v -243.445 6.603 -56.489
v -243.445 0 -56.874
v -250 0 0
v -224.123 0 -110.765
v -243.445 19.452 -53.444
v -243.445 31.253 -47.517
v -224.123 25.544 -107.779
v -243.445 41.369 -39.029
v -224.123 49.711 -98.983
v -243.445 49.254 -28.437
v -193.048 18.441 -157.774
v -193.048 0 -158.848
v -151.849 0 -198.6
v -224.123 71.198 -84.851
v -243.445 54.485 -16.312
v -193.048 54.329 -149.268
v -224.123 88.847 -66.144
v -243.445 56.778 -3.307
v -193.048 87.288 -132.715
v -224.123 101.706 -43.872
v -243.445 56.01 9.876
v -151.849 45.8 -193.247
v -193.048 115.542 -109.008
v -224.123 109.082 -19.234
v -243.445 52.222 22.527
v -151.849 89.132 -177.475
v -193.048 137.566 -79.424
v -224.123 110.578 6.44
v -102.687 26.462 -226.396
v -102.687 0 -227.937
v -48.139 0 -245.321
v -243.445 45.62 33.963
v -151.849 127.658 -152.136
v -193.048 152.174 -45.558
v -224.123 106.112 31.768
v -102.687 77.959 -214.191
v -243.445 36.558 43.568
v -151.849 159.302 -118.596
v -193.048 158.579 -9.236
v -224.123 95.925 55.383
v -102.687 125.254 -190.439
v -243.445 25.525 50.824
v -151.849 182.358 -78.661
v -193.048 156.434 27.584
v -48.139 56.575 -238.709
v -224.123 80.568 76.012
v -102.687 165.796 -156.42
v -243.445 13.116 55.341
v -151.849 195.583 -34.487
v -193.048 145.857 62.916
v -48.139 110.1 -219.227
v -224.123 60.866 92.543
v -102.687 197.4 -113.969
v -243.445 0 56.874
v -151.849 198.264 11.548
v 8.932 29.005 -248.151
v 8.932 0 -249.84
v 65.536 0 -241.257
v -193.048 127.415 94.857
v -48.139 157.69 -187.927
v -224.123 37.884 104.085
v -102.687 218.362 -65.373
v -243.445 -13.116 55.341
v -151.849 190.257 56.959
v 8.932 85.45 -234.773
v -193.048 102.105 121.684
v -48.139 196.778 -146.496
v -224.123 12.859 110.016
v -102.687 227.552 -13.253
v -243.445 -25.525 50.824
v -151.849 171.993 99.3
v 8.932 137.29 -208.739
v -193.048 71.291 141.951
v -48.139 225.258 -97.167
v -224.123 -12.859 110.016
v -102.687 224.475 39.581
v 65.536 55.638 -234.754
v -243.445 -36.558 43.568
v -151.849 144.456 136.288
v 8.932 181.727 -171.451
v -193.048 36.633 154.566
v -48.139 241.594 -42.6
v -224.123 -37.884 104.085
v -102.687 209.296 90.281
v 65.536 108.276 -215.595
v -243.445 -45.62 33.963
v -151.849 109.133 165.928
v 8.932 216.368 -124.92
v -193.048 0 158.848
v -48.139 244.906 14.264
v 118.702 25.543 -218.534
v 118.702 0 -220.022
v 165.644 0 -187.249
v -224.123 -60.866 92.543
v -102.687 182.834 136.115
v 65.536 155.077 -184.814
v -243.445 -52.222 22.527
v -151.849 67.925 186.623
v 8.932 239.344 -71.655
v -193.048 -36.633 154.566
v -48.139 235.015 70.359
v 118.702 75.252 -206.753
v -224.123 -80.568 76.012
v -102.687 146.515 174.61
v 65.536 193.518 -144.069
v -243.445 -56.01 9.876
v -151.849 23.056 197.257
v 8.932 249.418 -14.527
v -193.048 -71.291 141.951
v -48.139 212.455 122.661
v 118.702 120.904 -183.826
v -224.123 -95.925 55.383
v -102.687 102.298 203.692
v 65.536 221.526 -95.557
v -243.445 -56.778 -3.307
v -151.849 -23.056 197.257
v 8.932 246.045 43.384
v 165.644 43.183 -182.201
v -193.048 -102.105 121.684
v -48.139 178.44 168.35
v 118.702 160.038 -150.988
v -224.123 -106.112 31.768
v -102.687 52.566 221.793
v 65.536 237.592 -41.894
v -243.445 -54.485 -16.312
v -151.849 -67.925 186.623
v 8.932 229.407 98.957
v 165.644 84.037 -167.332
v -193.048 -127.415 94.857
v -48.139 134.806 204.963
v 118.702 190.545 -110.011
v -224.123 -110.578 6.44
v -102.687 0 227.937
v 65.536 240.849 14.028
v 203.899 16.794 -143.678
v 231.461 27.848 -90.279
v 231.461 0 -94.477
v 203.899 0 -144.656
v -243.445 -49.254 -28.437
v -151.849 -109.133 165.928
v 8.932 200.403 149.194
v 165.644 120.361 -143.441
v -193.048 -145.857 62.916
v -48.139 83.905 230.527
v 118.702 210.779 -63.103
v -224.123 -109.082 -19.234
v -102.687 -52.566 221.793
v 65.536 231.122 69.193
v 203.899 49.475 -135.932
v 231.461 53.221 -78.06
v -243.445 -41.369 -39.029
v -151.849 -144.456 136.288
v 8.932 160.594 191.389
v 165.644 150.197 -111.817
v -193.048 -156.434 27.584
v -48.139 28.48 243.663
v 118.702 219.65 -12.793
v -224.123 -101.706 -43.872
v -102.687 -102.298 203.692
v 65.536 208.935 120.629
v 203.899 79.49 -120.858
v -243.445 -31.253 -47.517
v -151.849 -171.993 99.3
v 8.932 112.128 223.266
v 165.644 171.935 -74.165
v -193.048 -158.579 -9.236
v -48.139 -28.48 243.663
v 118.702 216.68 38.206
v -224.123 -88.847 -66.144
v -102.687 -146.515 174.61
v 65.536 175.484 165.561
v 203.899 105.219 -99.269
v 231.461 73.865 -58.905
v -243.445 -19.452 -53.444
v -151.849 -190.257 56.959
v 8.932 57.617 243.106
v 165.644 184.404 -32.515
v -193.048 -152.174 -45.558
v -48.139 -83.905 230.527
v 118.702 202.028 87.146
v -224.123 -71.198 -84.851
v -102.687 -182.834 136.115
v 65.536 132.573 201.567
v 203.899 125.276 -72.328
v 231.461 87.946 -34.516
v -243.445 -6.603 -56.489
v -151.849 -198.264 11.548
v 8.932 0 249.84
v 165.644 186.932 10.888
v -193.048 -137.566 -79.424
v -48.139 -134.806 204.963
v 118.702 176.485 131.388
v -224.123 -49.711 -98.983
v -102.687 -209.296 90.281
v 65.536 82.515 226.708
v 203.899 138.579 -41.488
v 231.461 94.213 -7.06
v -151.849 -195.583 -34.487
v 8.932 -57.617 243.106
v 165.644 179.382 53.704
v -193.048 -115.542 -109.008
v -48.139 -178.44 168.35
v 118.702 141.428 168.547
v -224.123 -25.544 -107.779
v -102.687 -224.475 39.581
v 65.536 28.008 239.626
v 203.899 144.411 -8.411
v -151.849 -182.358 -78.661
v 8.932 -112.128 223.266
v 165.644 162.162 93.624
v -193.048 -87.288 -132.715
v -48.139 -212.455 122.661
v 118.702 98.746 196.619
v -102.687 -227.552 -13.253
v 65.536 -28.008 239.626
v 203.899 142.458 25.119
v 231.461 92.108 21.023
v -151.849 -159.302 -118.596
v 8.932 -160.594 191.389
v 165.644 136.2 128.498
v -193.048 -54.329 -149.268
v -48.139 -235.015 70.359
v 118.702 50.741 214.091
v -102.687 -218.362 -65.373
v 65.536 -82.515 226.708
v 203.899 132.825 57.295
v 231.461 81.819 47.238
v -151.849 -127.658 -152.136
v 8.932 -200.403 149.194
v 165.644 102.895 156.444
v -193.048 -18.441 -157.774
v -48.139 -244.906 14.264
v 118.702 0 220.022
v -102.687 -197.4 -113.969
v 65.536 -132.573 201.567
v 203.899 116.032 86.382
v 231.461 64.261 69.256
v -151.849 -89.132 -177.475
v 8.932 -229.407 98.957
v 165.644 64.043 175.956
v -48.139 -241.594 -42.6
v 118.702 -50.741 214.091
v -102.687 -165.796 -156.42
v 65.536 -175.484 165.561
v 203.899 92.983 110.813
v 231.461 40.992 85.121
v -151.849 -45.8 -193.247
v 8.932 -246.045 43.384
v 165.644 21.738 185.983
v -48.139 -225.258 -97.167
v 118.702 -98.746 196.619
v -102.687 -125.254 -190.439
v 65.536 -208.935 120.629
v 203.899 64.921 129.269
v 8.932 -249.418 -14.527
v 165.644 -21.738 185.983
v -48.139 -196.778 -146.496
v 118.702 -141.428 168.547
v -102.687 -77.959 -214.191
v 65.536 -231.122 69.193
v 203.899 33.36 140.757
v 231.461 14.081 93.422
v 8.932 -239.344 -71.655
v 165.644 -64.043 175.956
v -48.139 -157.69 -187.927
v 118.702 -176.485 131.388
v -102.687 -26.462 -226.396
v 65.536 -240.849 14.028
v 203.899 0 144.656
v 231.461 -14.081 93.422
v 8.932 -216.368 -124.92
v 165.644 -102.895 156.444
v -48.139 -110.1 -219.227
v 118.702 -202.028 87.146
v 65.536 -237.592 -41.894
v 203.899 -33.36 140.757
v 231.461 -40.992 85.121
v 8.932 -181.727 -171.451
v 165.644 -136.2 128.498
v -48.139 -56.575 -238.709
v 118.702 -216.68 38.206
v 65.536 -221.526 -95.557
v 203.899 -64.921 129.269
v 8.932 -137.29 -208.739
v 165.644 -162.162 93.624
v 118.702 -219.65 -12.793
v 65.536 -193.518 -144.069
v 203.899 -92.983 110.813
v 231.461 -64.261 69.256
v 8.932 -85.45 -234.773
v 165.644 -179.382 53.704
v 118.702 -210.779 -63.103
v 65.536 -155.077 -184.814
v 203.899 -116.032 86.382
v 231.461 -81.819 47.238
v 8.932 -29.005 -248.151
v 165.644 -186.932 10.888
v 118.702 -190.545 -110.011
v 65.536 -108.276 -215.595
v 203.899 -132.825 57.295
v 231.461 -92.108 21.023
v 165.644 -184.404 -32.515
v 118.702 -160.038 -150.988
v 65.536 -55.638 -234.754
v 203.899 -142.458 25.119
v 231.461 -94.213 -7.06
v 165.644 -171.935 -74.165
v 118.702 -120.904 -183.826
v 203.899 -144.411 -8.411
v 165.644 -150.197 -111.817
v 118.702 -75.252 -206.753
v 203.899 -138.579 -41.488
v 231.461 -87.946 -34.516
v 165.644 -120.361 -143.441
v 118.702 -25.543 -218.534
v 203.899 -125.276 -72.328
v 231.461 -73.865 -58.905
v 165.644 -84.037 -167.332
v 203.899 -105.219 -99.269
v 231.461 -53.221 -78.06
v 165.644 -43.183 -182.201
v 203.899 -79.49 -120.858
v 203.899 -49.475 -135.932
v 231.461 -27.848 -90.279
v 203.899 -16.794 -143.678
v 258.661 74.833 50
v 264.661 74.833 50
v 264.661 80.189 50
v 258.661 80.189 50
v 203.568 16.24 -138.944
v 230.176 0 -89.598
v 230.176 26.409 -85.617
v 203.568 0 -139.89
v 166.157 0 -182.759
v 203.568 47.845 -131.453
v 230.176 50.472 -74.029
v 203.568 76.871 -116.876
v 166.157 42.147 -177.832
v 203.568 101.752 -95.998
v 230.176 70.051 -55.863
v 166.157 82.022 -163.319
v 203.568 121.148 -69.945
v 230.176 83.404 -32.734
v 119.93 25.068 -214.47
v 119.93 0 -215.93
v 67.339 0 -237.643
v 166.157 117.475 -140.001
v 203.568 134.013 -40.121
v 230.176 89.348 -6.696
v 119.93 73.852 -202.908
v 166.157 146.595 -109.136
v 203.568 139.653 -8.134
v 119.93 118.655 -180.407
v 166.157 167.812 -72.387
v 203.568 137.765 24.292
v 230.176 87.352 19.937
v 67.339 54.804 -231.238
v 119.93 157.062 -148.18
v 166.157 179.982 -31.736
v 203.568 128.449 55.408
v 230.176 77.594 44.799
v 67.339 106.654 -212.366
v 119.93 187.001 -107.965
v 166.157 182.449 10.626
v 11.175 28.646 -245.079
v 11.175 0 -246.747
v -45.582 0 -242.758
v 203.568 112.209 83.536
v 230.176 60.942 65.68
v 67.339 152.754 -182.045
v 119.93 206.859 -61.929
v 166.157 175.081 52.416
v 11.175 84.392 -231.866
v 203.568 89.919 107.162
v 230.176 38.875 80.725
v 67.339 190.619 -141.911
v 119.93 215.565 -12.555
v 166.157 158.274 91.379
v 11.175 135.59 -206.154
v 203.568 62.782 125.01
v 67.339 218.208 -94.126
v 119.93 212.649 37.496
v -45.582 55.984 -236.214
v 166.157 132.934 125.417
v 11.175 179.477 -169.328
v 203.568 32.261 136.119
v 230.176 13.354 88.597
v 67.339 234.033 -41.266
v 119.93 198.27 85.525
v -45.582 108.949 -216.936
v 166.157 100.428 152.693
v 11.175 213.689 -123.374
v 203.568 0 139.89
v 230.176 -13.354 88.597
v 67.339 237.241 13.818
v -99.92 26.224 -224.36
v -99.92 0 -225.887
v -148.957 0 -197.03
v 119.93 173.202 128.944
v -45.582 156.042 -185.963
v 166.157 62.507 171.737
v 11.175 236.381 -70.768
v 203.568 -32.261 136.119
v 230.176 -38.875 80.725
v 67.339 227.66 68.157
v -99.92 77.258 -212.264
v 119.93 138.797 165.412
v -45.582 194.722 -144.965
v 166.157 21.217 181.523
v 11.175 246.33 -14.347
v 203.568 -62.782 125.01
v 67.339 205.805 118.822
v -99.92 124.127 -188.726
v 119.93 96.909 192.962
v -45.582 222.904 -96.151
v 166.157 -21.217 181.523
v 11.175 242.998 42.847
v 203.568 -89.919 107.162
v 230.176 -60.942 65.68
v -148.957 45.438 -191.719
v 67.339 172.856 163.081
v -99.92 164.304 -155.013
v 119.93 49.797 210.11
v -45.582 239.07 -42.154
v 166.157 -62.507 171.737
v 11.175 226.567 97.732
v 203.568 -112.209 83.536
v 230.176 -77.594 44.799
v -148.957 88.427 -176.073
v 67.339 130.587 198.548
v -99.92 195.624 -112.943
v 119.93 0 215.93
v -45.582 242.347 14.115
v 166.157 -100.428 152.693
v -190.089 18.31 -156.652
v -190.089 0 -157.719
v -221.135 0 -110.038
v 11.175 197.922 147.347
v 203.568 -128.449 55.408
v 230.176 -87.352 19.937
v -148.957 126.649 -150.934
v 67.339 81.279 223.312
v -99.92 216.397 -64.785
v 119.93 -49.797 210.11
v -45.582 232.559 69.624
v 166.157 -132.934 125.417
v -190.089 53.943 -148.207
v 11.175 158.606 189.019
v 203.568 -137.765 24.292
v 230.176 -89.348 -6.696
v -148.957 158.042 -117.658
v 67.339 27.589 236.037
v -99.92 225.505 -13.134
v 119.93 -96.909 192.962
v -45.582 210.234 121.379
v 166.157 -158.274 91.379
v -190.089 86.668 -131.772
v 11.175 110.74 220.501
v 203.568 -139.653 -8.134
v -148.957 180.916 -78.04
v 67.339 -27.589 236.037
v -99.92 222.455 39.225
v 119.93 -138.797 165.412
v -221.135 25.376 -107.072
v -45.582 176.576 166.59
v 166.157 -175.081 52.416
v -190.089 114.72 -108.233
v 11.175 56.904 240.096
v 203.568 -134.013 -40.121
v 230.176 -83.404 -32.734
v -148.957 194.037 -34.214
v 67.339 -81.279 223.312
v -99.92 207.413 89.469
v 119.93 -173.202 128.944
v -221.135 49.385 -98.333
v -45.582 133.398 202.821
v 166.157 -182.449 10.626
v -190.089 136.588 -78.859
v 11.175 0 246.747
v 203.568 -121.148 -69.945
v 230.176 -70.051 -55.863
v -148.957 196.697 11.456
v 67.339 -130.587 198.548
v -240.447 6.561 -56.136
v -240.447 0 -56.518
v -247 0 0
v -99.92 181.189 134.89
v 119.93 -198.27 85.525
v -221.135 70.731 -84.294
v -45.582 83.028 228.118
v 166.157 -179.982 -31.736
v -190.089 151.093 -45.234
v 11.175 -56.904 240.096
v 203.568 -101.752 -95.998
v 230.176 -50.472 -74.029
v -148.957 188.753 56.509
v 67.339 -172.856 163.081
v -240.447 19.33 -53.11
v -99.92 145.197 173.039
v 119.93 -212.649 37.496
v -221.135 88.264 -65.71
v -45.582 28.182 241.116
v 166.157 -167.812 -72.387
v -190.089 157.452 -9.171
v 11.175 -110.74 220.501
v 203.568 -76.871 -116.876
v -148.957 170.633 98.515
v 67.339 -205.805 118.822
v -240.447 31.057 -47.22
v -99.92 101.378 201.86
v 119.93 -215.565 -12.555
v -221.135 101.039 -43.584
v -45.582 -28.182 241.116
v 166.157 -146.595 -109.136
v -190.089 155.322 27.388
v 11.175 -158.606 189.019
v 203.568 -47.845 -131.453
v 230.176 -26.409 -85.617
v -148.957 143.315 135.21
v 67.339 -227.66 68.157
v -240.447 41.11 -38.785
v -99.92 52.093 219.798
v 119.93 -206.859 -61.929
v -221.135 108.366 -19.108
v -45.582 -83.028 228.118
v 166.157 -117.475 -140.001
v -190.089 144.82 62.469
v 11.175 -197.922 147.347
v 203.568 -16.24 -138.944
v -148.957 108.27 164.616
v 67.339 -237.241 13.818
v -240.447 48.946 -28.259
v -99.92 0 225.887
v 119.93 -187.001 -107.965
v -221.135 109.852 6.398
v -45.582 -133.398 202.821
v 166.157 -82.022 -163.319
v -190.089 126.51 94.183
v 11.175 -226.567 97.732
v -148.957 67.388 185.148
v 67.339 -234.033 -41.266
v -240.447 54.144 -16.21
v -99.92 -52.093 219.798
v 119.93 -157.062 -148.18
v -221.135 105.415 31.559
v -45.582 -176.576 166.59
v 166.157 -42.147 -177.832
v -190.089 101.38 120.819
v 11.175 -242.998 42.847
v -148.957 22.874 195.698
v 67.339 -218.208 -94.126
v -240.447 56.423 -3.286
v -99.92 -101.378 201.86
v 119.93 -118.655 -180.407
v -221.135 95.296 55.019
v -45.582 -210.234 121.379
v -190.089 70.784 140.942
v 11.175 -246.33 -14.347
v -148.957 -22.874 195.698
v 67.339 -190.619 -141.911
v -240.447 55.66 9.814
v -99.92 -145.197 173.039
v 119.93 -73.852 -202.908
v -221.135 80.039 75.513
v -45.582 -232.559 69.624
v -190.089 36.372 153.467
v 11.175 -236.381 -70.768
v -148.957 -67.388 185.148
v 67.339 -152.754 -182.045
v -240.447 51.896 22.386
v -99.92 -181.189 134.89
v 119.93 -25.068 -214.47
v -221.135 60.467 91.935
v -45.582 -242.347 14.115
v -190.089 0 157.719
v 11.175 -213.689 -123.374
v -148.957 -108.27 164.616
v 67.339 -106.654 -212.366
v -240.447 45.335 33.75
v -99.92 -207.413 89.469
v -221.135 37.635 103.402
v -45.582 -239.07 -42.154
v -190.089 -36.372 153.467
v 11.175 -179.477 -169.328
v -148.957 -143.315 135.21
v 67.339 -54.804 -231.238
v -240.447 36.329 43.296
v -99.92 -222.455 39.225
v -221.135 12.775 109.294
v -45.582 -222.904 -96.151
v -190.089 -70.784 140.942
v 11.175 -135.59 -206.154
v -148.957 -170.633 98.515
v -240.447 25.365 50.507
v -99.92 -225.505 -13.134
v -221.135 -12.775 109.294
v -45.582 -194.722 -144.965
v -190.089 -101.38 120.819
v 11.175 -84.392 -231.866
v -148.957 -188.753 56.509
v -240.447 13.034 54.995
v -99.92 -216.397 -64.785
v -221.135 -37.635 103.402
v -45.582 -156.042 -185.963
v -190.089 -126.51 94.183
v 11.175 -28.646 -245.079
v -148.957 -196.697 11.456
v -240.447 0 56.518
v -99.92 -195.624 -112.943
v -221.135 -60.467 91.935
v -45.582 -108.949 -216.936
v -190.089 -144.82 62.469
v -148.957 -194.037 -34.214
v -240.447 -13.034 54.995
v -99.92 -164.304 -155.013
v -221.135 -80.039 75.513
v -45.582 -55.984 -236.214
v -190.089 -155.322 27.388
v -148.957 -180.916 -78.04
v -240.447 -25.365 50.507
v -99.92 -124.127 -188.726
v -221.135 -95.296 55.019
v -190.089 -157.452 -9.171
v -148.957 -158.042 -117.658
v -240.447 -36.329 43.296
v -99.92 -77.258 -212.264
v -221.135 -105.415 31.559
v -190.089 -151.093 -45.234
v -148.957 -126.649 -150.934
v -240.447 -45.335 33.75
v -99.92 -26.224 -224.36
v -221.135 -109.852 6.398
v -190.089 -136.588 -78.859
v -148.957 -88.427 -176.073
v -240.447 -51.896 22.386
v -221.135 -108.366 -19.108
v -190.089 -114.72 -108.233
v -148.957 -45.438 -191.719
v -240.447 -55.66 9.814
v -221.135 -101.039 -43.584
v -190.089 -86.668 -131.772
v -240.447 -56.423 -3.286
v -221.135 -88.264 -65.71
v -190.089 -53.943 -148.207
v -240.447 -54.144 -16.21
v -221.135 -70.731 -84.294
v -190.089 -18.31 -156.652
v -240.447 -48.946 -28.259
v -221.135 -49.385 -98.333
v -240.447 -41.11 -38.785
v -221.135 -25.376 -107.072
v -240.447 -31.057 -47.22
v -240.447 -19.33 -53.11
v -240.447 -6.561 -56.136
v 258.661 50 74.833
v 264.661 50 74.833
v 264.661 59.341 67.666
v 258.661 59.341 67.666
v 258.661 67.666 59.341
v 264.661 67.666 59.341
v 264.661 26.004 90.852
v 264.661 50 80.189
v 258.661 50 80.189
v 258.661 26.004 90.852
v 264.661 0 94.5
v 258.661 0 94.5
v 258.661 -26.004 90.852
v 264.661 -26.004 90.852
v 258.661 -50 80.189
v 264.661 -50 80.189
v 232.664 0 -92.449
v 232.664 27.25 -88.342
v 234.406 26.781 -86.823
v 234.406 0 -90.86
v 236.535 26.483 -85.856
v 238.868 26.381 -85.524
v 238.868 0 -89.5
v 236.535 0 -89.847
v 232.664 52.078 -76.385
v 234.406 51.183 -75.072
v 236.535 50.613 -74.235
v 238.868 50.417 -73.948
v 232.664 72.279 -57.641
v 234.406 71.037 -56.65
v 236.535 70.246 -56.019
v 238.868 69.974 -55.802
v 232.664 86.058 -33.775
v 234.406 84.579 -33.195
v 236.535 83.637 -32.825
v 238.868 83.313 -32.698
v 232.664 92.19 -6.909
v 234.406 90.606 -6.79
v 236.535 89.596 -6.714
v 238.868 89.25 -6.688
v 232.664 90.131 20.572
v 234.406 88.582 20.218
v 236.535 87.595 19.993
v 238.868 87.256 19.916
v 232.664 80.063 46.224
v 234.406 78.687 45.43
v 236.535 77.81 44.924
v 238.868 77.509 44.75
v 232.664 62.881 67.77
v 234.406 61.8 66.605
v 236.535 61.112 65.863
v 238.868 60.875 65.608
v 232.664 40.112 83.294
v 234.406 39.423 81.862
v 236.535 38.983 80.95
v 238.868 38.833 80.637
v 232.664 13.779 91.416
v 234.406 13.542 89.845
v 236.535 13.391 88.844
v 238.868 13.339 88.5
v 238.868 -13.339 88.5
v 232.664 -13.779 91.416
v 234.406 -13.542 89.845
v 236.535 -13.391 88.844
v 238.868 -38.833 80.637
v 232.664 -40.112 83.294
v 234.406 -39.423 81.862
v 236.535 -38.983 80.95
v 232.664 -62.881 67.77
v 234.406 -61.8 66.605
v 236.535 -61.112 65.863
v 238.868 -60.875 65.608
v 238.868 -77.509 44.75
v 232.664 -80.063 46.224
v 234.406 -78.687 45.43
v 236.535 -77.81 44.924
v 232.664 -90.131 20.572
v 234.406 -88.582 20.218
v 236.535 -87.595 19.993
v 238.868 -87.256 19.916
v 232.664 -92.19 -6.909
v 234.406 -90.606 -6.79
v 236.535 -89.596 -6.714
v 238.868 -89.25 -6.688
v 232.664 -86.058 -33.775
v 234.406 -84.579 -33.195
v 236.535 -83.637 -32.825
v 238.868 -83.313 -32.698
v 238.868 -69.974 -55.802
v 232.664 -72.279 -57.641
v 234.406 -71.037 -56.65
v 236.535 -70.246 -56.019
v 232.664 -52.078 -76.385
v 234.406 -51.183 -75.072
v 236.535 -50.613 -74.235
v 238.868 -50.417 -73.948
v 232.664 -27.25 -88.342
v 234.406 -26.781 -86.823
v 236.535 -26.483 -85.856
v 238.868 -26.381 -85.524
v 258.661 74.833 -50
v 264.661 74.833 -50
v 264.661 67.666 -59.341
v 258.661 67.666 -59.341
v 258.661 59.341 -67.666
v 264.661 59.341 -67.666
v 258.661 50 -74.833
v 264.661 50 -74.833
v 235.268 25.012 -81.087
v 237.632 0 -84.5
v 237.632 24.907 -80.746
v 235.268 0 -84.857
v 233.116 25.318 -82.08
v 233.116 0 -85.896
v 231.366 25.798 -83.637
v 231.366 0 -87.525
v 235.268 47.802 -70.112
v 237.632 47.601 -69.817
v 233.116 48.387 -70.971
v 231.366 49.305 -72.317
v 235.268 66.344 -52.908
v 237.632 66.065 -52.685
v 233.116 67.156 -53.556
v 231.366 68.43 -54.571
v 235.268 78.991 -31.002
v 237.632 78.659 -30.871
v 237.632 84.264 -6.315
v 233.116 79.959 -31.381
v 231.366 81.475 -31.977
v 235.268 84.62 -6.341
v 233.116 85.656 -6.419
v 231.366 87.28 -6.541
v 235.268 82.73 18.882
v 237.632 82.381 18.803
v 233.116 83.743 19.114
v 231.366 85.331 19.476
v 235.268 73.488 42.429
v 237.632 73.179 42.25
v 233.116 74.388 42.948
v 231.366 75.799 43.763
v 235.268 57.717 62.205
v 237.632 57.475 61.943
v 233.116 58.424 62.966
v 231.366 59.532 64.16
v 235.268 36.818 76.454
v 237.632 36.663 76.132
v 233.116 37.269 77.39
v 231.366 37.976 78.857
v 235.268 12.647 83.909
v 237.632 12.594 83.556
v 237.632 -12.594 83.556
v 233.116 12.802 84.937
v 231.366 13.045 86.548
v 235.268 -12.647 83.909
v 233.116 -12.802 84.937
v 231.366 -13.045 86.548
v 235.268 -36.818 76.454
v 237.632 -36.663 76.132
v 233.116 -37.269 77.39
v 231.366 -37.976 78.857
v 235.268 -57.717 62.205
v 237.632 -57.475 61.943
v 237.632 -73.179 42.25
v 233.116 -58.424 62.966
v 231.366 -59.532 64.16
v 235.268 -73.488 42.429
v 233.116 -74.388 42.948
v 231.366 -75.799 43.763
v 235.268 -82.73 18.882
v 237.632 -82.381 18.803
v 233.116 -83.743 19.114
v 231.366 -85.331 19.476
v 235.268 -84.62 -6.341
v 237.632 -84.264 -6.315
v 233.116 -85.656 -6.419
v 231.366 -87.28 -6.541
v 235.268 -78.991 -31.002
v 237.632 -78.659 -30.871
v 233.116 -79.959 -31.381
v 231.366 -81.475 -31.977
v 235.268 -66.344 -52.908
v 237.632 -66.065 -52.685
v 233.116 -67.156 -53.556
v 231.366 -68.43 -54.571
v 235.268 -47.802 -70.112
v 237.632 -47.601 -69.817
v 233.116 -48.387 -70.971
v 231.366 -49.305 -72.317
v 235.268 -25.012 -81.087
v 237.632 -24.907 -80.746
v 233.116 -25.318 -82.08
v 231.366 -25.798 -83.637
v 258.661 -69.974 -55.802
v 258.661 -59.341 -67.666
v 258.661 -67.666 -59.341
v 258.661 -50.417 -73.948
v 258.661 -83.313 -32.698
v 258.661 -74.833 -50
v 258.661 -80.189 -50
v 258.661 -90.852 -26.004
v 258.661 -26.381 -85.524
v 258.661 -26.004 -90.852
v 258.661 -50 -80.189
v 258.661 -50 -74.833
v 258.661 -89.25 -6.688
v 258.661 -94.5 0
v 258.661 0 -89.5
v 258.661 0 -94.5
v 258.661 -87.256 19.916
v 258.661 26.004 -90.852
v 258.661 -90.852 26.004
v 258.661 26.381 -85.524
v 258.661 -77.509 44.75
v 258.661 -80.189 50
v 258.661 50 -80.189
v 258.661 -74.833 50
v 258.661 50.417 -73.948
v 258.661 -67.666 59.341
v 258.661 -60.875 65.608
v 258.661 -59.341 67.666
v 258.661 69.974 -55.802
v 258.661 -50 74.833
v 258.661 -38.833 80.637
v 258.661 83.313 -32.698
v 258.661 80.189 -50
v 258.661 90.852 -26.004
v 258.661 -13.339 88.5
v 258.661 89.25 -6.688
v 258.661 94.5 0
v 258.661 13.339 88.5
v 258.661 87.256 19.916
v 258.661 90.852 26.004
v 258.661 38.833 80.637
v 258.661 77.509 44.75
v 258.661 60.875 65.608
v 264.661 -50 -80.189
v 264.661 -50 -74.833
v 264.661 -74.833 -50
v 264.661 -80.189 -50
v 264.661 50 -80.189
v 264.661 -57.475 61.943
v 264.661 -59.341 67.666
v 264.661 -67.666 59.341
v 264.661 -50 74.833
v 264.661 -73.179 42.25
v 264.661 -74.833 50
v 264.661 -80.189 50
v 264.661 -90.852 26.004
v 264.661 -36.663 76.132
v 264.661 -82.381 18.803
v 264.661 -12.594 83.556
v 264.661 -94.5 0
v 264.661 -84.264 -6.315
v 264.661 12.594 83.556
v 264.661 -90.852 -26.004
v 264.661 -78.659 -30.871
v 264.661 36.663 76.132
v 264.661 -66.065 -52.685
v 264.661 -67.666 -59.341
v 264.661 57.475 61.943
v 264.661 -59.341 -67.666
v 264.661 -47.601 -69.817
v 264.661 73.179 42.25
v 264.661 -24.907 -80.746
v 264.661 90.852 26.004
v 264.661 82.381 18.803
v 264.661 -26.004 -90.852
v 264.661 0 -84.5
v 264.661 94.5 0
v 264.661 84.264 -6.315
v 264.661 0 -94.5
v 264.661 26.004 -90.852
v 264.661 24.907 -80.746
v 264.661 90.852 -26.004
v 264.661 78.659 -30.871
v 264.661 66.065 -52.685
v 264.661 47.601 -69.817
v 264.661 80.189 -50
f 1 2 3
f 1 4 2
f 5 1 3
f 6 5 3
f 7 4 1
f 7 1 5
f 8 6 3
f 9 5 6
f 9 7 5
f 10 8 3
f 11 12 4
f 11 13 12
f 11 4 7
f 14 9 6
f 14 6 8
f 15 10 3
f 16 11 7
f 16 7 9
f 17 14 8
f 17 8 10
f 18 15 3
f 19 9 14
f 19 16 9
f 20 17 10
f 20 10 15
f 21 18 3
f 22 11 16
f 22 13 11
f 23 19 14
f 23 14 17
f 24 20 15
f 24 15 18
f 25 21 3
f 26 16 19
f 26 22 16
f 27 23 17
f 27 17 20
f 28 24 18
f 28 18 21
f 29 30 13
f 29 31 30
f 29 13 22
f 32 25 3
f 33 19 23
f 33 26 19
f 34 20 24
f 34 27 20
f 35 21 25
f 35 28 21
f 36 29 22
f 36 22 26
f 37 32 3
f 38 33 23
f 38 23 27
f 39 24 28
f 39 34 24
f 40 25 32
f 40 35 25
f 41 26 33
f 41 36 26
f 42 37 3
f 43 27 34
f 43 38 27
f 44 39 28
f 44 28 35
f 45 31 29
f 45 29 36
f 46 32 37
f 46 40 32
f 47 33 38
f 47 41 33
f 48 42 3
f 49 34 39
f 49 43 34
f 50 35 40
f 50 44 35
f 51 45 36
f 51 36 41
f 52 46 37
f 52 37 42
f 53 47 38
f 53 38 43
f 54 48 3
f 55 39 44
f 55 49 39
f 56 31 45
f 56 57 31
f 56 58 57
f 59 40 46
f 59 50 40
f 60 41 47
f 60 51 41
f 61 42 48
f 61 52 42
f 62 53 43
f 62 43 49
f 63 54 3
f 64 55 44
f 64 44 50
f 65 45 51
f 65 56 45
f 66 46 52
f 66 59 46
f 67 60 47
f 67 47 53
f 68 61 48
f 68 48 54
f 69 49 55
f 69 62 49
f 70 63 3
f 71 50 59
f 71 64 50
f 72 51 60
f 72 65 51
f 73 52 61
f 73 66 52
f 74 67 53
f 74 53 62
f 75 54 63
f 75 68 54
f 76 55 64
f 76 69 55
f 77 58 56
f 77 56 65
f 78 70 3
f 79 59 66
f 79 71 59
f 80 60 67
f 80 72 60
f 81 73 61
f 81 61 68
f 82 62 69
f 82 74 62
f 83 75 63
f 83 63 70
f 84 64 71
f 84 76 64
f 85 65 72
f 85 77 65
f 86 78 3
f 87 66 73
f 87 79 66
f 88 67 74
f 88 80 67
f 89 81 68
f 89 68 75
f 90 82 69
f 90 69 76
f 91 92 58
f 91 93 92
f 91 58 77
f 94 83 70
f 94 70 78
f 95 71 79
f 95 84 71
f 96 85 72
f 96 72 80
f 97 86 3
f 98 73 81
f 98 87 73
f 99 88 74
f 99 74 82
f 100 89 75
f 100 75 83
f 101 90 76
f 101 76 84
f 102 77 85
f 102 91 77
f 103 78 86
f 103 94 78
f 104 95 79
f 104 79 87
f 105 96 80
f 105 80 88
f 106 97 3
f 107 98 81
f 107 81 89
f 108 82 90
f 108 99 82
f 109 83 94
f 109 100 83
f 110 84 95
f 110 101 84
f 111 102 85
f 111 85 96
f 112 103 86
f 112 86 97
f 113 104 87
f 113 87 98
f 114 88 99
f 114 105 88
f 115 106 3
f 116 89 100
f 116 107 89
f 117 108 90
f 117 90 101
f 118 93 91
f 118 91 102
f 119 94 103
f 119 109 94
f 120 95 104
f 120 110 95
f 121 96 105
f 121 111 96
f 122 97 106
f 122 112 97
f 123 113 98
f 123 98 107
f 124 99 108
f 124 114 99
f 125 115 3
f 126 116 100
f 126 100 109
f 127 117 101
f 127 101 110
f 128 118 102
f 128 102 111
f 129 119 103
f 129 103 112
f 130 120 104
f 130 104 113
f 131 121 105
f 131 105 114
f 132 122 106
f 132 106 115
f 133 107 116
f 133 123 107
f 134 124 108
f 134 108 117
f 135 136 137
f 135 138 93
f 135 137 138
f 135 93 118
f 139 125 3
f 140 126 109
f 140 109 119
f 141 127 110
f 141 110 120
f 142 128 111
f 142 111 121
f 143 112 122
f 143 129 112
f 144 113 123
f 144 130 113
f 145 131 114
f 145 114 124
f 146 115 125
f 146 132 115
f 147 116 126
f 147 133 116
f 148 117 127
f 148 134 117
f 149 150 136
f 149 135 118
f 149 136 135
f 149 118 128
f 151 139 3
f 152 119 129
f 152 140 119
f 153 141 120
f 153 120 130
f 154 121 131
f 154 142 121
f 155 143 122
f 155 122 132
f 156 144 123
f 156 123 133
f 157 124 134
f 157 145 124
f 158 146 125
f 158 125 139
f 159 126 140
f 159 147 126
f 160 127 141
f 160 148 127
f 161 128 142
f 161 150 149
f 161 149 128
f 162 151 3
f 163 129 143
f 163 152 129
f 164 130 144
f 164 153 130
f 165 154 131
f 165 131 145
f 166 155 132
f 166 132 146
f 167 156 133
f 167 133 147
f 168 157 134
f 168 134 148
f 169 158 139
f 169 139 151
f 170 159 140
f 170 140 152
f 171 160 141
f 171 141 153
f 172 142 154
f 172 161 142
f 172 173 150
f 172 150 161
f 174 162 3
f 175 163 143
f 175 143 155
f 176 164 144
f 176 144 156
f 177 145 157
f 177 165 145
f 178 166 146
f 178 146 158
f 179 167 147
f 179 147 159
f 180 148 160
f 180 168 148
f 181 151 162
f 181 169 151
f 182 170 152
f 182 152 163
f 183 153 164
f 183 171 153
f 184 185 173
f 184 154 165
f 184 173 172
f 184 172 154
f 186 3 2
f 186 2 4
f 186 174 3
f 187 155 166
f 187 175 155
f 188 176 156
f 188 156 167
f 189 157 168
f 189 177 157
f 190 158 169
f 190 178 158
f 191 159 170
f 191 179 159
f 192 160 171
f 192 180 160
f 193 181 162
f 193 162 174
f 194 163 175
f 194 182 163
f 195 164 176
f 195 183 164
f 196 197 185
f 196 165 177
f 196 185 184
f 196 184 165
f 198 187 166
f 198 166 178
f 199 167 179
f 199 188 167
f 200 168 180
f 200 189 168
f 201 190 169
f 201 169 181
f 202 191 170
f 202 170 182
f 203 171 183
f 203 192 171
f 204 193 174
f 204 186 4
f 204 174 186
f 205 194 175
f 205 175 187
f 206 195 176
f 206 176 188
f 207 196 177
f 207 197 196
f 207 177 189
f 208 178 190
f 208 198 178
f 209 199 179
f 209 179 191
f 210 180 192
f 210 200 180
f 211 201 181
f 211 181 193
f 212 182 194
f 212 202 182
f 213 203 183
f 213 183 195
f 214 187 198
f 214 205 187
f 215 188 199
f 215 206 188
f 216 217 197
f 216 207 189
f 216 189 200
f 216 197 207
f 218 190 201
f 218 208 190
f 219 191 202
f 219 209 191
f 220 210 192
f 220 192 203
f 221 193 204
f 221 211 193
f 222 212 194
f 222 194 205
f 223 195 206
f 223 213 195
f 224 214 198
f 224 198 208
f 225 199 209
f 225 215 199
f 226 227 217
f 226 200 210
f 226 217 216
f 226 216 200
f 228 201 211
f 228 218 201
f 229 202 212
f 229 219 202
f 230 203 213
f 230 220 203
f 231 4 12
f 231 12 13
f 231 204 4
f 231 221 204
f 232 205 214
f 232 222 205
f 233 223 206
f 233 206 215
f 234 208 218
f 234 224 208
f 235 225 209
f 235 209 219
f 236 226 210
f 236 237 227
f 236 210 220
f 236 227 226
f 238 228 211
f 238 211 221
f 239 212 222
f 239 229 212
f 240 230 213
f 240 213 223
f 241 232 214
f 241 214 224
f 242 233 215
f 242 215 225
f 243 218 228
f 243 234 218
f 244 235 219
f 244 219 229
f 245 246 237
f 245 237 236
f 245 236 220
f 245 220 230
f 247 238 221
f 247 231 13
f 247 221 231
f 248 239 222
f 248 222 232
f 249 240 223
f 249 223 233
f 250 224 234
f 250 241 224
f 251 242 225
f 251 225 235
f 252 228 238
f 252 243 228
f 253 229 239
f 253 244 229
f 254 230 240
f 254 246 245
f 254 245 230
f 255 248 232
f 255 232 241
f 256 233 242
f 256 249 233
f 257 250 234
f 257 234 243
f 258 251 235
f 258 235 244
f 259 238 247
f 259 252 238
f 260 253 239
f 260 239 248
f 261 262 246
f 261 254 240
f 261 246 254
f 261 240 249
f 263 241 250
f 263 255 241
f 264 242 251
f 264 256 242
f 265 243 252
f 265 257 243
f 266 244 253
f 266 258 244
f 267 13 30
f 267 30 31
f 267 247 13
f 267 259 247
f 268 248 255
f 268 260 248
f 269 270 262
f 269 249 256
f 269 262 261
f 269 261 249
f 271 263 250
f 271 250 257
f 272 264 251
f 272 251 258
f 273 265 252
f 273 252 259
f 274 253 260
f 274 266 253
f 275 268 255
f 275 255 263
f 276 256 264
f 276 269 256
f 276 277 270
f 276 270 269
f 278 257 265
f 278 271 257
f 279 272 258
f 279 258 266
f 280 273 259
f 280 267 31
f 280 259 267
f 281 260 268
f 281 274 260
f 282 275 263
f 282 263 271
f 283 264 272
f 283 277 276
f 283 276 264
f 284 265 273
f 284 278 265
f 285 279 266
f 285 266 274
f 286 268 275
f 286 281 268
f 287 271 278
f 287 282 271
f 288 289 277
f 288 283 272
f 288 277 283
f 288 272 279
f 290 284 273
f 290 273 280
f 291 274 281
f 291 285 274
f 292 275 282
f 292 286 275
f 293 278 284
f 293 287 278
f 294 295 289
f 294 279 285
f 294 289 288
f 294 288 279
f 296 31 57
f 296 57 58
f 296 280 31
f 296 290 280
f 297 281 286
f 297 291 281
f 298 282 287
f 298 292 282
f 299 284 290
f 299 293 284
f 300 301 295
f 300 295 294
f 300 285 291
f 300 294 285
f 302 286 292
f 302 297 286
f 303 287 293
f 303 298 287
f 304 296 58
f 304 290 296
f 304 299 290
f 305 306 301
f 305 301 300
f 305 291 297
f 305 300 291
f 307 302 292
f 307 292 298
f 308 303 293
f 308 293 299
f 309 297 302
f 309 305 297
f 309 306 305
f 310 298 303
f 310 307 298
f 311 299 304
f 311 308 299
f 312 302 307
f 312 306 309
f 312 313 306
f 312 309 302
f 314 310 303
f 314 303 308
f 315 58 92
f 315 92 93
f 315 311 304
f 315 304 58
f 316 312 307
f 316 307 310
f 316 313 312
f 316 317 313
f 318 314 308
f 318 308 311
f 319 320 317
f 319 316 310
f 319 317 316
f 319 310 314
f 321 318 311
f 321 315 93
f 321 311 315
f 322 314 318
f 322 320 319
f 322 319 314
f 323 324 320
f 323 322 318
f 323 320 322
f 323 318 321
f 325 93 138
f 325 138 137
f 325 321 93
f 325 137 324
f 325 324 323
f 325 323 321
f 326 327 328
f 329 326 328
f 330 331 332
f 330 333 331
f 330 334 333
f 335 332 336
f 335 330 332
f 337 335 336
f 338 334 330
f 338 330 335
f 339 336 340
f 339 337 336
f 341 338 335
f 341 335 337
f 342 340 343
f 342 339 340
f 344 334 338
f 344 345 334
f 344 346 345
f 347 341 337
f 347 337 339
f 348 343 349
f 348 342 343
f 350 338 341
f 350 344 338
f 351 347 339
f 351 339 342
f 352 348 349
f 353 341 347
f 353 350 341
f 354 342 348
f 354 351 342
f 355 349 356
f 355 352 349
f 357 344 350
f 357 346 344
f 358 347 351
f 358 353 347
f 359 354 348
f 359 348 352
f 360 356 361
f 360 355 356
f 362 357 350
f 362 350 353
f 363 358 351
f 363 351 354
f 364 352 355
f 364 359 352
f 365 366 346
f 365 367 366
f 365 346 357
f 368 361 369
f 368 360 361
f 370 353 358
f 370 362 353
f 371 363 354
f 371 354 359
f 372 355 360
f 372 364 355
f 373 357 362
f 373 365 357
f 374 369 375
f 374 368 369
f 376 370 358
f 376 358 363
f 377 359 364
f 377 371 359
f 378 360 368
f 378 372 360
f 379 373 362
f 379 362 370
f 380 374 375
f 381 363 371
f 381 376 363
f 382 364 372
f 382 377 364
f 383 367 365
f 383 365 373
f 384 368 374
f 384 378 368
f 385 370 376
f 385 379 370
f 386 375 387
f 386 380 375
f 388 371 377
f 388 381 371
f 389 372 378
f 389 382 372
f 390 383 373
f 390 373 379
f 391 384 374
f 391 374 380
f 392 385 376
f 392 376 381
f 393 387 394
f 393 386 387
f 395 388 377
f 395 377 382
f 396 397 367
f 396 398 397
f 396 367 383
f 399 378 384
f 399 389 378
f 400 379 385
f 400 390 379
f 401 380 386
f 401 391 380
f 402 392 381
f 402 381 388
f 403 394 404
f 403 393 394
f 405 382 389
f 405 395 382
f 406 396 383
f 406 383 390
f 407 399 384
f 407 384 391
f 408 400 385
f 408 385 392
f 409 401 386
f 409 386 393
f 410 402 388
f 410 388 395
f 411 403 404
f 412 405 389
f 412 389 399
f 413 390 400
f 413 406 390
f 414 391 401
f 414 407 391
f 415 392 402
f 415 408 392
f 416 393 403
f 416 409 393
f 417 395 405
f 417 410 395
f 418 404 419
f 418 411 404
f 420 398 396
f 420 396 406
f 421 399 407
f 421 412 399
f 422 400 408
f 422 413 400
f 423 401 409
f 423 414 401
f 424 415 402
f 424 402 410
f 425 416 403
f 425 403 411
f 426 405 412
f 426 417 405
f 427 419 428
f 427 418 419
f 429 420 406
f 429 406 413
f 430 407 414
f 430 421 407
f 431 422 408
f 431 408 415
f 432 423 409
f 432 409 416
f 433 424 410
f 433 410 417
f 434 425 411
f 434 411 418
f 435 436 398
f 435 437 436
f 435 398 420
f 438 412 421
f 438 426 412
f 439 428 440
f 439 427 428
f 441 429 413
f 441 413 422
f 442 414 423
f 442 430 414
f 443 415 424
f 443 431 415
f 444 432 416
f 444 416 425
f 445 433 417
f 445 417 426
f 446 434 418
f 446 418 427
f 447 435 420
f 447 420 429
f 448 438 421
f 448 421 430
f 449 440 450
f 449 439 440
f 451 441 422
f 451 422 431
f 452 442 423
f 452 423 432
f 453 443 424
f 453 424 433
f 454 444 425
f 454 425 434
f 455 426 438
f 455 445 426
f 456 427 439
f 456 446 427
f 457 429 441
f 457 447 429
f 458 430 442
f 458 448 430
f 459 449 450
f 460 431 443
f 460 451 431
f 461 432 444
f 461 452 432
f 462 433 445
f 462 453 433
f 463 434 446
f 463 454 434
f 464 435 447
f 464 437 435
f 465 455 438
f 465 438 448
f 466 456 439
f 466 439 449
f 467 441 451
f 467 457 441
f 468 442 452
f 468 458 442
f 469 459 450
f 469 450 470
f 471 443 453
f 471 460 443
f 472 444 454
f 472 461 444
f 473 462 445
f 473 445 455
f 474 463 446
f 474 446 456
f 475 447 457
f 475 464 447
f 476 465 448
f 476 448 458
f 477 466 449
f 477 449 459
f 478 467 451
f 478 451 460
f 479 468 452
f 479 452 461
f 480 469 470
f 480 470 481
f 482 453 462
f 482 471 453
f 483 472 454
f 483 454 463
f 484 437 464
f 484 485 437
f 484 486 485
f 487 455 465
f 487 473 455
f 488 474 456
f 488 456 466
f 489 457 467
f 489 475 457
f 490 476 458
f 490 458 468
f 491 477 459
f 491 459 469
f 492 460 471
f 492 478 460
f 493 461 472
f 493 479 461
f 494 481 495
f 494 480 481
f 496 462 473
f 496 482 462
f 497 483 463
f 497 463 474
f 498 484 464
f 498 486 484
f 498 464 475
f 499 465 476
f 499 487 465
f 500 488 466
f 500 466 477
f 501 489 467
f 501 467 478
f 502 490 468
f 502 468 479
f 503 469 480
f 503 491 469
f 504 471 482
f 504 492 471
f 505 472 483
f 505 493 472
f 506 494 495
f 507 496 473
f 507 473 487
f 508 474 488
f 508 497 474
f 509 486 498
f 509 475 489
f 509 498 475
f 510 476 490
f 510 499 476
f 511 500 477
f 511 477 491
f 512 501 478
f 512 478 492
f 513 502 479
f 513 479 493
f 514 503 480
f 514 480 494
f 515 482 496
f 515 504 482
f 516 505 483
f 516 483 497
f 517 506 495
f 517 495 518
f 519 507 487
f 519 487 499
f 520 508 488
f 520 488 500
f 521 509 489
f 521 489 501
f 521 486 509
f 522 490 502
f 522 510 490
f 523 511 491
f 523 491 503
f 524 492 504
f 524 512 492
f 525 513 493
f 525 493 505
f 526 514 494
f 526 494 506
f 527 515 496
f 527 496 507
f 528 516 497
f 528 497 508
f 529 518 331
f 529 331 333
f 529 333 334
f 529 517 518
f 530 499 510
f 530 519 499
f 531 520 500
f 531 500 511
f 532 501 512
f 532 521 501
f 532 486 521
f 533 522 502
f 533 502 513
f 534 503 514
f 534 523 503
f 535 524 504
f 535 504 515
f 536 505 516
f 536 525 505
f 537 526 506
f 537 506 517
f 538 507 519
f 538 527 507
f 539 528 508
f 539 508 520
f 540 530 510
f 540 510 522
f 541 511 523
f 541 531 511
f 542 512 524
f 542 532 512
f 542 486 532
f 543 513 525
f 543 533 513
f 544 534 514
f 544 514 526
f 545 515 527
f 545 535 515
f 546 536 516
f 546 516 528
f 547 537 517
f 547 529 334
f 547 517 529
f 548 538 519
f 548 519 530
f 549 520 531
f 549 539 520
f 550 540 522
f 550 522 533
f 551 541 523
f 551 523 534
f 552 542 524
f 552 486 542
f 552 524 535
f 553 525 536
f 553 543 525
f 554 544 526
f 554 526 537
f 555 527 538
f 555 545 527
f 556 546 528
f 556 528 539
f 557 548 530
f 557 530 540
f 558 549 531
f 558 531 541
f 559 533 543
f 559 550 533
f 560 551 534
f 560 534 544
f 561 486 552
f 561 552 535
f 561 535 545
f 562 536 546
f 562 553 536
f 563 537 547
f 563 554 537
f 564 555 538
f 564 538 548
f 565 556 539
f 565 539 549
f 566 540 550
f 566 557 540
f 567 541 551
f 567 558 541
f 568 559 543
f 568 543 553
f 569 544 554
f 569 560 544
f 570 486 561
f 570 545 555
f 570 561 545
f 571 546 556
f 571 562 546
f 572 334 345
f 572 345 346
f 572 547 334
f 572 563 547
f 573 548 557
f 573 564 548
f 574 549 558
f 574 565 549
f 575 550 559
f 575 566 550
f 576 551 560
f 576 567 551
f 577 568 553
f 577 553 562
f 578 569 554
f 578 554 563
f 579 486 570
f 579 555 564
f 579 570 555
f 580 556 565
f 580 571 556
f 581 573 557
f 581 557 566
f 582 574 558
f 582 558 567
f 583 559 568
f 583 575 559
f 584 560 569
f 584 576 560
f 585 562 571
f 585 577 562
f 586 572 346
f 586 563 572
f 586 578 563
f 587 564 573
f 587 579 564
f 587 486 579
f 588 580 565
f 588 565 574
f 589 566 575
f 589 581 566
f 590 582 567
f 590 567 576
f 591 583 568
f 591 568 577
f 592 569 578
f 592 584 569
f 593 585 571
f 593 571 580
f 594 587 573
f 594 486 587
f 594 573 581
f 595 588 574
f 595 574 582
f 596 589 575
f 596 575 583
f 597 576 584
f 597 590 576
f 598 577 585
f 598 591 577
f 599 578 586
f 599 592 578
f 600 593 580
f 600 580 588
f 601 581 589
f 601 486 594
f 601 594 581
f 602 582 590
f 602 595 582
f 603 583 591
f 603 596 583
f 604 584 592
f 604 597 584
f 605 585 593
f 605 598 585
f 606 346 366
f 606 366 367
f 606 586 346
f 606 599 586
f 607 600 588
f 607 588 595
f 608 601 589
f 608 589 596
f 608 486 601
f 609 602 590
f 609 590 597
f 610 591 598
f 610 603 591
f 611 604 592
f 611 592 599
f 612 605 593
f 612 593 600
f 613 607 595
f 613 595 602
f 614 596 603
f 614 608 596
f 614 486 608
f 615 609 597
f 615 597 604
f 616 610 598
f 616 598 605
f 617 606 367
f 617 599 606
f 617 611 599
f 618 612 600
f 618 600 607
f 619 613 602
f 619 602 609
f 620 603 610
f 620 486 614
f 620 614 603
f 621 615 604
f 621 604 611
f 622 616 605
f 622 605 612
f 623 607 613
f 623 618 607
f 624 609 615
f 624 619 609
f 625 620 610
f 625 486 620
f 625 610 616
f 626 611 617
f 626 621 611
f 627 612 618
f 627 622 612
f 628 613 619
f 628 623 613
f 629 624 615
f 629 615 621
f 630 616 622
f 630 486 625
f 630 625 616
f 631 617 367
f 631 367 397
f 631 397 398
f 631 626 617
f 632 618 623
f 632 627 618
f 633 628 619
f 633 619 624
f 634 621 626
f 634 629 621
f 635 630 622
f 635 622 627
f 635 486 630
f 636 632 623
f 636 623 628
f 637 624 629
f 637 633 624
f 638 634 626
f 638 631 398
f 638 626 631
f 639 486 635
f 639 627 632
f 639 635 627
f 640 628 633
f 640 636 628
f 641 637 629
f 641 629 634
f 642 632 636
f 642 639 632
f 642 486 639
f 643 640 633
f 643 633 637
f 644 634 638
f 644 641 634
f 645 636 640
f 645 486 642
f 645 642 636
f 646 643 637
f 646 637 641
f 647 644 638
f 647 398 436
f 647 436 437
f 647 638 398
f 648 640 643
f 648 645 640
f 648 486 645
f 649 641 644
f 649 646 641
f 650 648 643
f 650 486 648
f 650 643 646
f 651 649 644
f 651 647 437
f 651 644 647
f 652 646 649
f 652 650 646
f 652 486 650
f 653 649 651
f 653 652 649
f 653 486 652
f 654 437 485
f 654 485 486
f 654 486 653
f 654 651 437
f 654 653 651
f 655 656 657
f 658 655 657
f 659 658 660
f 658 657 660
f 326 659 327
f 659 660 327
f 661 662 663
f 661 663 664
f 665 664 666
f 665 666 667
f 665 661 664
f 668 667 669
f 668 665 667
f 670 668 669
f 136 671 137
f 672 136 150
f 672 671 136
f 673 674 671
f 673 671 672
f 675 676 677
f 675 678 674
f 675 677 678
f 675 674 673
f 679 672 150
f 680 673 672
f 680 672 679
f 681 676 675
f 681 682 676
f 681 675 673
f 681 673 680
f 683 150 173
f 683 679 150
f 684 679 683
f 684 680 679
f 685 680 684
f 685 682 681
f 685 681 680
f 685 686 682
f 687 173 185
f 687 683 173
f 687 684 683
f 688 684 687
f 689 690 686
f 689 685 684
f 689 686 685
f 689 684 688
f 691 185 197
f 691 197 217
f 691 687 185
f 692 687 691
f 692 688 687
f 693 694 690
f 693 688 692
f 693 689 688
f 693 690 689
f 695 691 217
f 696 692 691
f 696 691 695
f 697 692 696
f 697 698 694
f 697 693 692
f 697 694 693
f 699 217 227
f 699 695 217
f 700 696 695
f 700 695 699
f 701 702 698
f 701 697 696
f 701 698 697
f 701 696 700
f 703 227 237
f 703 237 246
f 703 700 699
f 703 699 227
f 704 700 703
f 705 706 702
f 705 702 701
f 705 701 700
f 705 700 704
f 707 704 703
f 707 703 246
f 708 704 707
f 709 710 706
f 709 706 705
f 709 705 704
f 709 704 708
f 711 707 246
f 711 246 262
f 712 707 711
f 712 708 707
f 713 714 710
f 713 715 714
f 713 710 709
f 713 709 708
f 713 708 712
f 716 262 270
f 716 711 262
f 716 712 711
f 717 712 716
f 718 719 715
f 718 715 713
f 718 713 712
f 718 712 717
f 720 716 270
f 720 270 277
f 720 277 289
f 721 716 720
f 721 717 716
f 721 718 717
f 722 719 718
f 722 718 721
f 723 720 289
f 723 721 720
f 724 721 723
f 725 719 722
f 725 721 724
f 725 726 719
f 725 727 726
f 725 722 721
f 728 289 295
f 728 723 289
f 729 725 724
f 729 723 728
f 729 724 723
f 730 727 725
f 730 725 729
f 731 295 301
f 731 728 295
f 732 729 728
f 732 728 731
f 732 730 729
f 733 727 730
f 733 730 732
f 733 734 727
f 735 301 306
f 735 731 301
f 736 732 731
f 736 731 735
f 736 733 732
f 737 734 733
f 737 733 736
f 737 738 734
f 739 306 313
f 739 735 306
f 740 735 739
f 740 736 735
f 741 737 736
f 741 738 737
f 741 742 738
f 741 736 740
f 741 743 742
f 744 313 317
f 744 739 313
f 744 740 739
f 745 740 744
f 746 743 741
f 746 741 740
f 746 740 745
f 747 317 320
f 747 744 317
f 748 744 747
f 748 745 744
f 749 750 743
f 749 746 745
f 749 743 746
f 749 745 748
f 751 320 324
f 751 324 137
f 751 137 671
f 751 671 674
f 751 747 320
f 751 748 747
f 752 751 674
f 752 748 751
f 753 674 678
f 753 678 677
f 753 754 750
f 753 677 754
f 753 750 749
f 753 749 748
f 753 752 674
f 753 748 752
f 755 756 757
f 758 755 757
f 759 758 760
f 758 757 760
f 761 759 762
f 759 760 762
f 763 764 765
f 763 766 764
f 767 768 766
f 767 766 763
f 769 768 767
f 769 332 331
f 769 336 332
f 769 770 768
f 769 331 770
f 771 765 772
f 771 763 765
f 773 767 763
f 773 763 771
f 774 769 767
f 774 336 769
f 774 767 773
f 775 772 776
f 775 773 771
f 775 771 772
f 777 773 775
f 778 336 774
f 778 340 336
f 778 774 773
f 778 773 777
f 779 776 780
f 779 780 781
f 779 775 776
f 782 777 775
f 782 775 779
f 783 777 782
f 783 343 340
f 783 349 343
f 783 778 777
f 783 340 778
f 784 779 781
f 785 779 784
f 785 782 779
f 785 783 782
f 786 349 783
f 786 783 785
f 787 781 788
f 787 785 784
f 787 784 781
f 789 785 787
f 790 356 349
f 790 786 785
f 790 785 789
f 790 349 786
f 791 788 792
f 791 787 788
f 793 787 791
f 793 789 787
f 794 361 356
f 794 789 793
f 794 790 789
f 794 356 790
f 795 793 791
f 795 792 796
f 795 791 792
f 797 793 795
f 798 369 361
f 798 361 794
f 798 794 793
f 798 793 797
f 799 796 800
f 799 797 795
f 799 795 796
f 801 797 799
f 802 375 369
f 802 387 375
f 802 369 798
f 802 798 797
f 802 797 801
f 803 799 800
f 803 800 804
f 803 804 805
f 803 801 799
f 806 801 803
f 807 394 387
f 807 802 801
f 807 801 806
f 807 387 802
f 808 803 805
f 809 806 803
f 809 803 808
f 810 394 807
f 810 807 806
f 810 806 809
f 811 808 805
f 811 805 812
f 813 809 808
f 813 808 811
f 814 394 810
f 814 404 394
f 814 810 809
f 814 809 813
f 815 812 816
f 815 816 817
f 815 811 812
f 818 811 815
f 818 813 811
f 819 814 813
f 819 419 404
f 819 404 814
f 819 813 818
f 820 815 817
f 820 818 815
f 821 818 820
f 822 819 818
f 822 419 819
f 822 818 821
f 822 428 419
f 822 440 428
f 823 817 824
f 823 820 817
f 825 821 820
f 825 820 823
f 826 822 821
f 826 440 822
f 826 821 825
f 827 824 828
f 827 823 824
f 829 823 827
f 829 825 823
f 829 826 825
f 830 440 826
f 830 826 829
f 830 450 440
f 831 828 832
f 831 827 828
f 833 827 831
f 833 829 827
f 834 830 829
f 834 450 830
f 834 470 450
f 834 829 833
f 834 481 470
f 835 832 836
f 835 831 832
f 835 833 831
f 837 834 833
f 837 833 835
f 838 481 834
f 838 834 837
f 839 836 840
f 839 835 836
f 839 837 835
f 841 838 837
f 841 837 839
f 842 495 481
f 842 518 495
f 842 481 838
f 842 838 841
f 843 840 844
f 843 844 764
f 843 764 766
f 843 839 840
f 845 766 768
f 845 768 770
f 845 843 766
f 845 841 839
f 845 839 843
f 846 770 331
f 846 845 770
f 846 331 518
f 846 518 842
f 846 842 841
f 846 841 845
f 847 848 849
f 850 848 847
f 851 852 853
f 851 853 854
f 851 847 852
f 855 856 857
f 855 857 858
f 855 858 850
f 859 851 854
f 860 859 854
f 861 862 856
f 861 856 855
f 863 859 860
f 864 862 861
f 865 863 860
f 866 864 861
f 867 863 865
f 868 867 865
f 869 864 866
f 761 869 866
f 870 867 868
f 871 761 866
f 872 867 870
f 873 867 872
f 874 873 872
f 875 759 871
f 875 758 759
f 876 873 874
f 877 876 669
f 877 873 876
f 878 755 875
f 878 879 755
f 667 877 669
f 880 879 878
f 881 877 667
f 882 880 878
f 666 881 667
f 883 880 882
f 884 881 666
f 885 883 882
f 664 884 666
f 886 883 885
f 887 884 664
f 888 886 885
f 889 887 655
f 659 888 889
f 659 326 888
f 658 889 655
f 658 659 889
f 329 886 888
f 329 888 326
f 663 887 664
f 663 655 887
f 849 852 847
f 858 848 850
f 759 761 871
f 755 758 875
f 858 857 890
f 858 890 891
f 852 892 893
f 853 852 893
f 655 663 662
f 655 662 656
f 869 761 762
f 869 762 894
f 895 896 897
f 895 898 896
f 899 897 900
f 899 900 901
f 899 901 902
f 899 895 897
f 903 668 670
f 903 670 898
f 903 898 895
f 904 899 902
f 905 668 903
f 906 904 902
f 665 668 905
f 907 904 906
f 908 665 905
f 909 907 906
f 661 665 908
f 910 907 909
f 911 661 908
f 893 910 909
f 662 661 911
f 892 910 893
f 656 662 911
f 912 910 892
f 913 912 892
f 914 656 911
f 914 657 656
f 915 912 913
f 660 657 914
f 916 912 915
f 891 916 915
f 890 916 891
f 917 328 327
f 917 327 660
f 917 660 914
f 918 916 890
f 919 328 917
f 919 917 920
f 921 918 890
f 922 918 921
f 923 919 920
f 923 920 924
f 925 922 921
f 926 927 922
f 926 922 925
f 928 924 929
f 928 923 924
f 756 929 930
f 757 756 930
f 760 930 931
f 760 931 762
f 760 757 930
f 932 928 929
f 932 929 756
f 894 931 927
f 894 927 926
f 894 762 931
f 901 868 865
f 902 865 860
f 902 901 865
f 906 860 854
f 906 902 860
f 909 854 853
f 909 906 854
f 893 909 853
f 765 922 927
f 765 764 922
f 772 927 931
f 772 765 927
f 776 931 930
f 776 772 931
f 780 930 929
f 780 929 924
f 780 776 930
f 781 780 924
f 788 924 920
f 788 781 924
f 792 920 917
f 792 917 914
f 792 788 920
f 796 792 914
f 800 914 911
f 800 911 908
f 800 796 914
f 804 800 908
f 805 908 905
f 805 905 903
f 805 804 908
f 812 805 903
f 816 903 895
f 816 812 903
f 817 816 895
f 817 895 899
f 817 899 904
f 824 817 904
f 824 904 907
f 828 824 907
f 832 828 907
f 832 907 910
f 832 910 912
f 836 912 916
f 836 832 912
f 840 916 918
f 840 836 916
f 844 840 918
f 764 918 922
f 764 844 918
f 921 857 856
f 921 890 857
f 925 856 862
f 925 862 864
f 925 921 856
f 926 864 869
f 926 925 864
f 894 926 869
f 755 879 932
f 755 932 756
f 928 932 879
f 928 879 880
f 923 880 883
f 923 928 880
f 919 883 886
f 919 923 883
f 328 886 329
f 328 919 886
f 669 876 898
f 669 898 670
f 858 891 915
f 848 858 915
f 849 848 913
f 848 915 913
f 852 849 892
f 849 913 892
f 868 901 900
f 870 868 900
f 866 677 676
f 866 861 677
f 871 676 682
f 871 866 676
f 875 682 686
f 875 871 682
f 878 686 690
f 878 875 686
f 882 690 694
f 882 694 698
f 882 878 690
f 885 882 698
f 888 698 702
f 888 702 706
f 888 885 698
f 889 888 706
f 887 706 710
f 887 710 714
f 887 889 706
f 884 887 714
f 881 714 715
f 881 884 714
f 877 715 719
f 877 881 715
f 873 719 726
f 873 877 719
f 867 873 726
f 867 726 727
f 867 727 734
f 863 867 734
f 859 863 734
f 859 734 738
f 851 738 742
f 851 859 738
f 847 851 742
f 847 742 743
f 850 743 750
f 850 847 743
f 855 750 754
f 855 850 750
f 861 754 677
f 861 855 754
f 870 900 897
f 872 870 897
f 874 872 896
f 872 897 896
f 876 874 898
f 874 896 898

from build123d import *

# Parameters (mm, degrees)
F3_DEPTH = 25


with BuildPart() as f1:
    # F0 (on Front) → F1 (revolve)
    with BuildSketch(Plane.XZ):
        with BuildLine():
            ThreePointArc((230.1764353028, -89.5980392157), (-45.581906938, -242.757677036), (-247, 0))
            Line((-247, 0), (-250, 0))
            ThreePointArc((-250, 0), (-48.1392607307, -245.3214454064), (231.4608926104, -94.476744186))
            ThreePointArc((231.4608926104, -94.476744186), (234.4059176567, -90.8597422297), (238.8676411739, -89.5))
            Line((238.8676411739, -89.5), (258.6609246731, -89.5))
            Line((258.6609246731, -89.5), (258.6609246731, -94.5))
            Line((258.6609246731, -94.5), (264.6609246731, -94.5))
            Line((264.6609246731, -94.5), (264.6609246731, -84.5))
            Line((264.6609246731, -84.5), (237.6315425191, -84.5))
            ThreePointArc((237.6315425191, -84.5), (233.1157749362, -85.8963765146), (230.1764353028, -89.5980392157))
        make_face()
    revolve(axis=Axis((132.3304623365, 0, 0), (1, 0, 0)))

    # F2 (on face) → F3 (cut)
    with BuildSketch(Plane.YZ.offset(264.6609246731)):
        with BuildLine():
            ThreePointArc((50, 74.8331477355), (63.6396103068, 63.6396103068), (74.8331477355, 50))
            Line((74.8331477355, 50), (80.1888396225, 50))
            ThreePointArc((80.1888396225, 50), (66.8215908221, 66.8215908221), (50, 80.1888396225))
            Line((50, 80.1888396225), (50, 74.8331477355))
        make_face()
        with BuildLine():
            Line((80.1888396225, -50), (74.8331477355, -50))
            ThreePointArc((74.8331477355, -50), (63.6396103068, -63.6396103068), (50, -74.8331477355))
            Line((50, -74.8331477355), (50, -80.1888396225))
            ThreePointArc((50, -80.1888396225), (66.8215908221, -66.8215908221), (80.1888396225, -50))
        make_face()
        with BuildLine():
            Line((119.5877417922, 50), (80.1888396225, 50))
            ThreePointArc((80.1888396225, 50), (90.8517895925, 26.0038906289), (94.5, 0))
            ThreePointArc((94.5, 0), (90.8517895925, -26.0038906289), (80.1888396225, -50))
            Line((80.1888396225, -50), (119.5877417922, -50))
            Line((119.5877417922, -50), (119.5877417922, 50))
        make_face()
        with BuildLine():
            ThreePointArc((-74.8331477355, 50), (-63.6396103068, 63.6396103068), (-50, 74.8331477355))
            Line((-50, 74.8331477355), (-50, 80.1888396225))
            ThreePointArc((-50, 80.1888396225), (-66.8215908221, 66.8215908221), (-80.1888396225, 50))
            Line((-80.1888396225, 50), (-74.8331477355, 50))
        make_face()
        with BuildLine():
            Line((-50, -80.1888396225), (-50, -74.8331477355))
            ThreePointArc((-50, -74.8331477355), (-63.6396103068, -63.6396103068), (-74.8331477355, -50))
            Line((-74.8331477355, -50), (-80.1888396225, -50))
            ThreePointArc((-80.1888396225, -50), (-66.8215908221, -66.8215908221), (-50, -80.1888396225))
        make_face()
        with BuildLine():
            ThreePointArc((-80.1888396225, -50), (-94.5, 0), (-80.1888396225, 50))
            Line((-80.1888396225, 50), (-119.5877417922, 50))
            Line((-119.5877417922, 50), (-119.5877417922, -50))
            Line((-119.5877417922, -50), (-80.1888396225, -50))
        make_face()
    extrude(amount=-F3_DEPTH, mode=Mode.SUBTRACT)


solid = f1.part
